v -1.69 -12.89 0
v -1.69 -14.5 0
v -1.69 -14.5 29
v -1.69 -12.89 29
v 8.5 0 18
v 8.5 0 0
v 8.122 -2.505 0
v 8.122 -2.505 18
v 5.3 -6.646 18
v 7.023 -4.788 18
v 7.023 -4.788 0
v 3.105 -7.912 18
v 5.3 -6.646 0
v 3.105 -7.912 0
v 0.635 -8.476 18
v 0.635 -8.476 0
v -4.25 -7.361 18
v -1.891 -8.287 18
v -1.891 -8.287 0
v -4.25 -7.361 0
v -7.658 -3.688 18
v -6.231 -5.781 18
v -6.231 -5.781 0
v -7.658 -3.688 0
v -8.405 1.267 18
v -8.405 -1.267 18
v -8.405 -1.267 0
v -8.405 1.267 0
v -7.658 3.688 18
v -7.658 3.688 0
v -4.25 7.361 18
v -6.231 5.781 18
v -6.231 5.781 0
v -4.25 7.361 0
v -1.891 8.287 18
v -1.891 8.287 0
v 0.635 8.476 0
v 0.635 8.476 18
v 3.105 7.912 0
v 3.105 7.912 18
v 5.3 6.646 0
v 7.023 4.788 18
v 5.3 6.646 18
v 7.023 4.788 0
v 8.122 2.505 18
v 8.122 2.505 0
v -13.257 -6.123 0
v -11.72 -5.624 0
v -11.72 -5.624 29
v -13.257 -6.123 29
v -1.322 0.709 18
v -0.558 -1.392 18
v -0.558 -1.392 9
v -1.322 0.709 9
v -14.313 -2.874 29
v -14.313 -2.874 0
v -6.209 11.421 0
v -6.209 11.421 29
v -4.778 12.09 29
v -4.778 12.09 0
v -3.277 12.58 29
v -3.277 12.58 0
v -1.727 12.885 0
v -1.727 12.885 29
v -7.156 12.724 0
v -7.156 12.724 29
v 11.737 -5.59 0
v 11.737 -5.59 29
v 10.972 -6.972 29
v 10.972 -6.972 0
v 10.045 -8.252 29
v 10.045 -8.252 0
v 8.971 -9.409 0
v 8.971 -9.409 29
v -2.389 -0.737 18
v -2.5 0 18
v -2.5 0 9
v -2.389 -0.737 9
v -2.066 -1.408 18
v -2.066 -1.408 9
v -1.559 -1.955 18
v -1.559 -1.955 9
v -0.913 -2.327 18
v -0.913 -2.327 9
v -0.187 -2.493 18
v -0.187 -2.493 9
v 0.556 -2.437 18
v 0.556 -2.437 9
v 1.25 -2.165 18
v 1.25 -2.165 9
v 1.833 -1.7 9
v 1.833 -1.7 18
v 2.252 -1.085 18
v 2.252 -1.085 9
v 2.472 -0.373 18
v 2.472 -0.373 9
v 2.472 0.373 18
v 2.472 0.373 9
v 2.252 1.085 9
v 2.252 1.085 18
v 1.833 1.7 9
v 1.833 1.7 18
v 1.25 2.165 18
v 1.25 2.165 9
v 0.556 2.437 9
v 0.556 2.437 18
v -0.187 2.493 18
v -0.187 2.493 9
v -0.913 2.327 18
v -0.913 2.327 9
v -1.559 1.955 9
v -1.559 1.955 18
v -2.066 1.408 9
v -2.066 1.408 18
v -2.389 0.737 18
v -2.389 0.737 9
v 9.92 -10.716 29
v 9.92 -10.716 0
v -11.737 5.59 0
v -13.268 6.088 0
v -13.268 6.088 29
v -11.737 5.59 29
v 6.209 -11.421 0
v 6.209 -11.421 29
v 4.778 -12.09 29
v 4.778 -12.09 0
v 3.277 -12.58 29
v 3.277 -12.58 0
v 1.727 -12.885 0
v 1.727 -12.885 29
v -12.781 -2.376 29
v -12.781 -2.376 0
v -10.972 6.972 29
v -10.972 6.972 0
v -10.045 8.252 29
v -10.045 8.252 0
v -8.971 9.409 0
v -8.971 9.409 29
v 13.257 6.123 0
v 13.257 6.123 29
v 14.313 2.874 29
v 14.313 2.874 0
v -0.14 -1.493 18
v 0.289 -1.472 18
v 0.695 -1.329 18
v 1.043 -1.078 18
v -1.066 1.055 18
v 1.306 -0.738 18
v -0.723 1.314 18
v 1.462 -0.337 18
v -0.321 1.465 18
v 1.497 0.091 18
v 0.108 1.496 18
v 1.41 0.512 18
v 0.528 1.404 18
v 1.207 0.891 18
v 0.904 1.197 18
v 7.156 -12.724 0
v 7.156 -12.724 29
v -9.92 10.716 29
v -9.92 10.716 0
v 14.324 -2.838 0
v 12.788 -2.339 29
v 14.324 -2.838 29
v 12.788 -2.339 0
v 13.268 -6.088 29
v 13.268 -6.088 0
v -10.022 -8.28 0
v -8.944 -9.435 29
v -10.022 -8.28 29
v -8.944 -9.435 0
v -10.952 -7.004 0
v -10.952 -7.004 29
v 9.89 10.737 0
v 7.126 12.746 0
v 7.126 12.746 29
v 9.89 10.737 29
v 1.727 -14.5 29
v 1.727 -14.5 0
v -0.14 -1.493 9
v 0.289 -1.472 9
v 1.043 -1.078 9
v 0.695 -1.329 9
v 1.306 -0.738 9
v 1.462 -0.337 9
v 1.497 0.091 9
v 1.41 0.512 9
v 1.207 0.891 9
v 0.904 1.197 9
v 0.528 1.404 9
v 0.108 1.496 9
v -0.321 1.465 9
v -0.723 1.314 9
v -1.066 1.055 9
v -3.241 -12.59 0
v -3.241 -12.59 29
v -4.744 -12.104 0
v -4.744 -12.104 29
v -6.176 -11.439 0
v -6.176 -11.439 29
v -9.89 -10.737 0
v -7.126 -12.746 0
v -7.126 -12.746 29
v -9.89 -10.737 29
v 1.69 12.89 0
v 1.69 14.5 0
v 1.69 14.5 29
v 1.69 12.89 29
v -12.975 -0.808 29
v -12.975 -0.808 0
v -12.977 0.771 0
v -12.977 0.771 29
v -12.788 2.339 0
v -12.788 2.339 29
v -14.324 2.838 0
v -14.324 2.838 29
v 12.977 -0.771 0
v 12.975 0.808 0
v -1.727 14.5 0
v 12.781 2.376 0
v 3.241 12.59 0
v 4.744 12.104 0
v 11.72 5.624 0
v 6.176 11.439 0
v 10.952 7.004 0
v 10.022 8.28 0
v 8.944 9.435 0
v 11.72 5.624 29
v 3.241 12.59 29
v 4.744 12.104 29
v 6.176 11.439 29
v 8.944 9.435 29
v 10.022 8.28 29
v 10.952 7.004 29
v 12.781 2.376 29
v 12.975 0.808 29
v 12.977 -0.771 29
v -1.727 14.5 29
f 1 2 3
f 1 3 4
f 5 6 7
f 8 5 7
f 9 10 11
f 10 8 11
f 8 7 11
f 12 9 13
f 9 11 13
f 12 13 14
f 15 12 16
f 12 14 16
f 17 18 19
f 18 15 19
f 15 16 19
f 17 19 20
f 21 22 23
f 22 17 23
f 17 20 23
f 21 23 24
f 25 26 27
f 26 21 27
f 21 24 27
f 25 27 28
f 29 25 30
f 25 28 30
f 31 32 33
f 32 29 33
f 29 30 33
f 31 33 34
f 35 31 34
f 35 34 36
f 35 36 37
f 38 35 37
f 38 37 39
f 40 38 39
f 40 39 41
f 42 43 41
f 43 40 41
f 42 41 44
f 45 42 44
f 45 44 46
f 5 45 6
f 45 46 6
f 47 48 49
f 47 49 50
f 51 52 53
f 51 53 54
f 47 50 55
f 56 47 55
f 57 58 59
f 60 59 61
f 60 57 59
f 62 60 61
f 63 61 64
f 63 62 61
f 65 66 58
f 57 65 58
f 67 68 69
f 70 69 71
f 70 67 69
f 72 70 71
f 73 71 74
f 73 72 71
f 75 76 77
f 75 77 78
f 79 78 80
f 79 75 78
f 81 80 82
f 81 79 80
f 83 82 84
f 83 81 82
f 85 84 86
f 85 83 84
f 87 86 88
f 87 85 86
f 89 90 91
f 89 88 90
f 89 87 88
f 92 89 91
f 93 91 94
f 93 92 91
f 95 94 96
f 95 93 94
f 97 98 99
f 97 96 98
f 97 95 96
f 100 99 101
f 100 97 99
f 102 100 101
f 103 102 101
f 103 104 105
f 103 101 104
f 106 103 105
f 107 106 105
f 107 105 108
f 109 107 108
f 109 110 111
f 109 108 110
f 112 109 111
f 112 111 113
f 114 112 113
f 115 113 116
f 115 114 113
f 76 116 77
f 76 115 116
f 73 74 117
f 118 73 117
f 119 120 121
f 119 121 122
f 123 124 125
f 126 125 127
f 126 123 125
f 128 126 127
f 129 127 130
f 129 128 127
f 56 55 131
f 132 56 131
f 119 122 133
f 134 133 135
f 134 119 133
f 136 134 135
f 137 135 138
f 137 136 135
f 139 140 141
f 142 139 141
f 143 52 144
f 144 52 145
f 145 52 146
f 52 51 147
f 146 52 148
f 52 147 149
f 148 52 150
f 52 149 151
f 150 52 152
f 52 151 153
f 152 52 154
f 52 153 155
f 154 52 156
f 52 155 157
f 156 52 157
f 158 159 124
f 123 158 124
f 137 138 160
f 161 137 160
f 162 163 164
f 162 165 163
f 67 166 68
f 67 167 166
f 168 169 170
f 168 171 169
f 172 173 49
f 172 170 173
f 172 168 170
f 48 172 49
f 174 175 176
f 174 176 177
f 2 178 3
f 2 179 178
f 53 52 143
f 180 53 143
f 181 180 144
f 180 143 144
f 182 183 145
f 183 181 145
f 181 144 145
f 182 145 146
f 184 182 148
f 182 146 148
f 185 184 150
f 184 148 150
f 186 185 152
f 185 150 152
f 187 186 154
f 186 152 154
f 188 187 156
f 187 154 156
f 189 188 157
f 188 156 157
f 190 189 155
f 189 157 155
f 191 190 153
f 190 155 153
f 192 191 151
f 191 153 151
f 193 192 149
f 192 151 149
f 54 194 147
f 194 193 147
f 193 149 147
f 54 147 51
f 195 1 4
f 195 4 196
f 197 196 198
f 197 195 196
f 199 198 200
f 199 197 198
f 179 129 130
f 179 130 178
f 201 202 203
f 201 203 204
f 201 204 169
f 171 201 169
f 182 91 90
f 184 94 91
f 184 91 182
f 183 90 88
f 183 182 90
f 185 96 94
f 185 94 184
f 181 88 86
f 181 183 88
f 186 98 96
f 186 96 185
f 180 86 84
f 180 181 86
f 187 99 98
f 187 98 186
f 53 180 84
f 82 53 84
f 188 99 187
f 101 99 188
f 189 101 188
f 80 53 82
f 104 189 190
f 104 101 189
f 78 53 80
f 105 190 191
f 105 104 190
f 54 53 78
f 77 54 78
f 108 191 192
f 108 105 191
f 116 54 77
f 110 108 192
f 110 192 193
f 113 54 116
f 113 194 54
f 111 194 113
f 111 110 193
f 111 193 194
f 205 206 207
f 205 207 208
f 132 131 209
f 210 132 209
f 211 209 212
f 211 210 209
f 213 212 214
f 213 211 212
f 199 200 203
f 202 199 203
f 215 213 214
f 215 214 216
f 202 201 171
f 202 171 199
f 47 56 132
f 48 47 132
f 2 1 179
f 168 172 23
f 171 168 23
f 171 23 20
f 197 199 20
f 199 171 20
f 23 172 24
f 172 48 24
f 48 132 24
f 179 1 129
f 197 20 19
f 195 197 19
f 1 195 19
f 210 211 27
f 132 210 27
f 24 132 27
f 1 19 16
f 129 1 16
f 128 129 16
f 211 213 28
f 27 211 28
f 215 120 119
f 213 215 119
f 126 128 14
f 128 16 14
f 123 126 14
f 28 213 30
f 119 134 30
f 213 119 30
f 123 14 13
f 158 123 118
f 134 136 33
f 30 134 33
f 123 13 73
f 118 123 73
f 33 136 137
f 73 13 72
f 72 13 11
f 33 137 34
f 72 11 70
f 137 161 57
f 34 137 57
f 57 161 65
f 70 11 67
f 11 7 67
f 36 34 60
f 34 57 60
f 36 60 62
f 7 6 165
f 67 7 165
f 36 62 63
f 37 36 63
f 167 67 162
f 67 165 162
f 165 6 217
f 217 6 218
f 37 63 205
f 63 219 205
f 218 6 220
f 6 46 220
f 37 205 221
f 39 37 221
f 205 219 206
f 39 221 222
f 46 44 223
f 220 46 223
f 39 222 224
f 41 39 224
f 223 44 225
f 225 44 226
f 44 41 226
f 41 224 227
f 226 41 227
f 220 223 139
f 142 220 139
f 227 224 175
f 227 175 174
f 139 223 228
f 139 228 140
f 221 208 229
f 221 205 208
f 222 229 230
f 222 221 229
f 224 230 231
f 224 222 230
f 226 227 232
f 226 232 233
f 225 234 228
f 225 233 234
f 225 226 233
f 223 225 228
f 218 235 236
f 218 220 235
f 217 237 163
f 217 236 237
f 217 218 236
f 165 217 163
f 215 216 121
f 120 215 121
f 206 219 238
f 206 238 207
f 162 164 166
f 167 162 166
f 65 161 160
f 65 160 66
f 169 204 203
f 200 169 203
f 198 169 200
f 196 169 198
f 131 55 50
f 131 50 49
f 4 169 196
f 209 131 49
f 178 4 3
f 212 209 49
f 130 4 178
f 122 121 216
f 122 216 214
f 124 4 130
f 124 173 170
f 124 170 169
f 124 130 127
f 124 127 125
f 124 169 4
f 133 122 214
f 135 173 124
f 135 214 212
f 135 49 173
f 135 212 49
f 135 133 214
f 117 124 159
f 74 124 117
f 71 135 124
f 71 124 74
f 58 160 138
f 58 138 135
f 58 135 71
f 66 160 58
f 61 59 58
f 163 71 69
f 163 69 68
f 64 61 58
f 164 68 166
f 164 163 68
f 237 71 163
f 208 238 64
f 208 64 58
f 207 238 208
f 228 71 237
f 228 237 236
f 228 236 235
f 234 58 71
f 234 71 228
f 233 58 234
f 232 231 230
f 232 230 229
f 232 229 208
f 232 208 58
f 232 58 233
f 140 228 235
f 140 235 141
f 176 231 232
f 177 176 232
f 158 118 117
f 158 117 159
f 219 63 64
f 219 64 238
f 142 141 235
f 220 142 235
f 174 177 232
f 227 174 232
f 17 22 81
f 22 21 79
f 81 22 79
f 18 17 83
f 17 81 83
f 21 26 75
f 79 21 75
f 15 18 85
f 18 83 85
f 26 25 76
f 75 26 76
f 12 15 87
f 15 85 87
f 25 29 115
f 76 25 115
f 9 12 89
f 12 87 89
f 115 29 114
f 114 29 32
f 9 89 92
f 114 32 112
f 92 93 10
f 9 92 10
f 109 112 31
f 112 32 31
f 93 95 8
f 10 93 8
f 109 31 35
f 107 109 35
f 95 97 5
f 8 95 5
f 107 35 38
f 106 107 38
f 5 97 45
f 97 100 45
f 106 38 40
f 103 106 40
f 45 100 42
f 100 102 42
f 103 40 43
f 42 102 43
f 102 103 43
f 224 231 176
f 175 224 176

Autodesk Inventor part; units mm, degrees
ref_plane "YZ Plane" through (0, 0, 0) normal (1, 0, 0) x (0, 1, 0)
ref_plane "XZ Plane" through (0, 0, 0) normal (0, 1, 0) x (-1, 0, 0)
sketch "Sketch1" plane through (0, 0, 0) normal (0, 0, 1) x (1, 0, 0)
  circle A0 centre (0, 0) radius 17 construction
  circle A1 centre (0, 0) radius 8.5
  line L0 (-1.727, 14.5) -> (1.69, 14.5)
  line L1 (1.69, 14.5) -> (1.69, 12.8897)
  line L2 (-1.727, 12.8848) -> (-1.727, 14.5)
  line L3 (-7.1557, 12.7241) -> (-6.2091, 11.4213)
  line L4 (-9.92, 10.7157) -> (-7.1557, 12.7241)
  line L5 (-8.9706, 9.4089) -> (-9.92, 10.7157)
  line L6 (-13.2681, 6.088) -> (-11.7366, 5.5904)
  line L7 (-14.324, 2.8383) -> (-13.2681, 6.088)
  line L8 (-12.7878, 2.3392) -> (-14.324, 2.8383)
  line L9 (-14.3126, -2.8735) -> (-12.7811, -2.3759)
  line L10 (-13.2567, -6.1232) -> (-14.3126, -2.8735)
  line L11 (-11.7205, -5.624) -> (-13.2567, -6.1232)
  line L12 (-9.8901, -10.7374) -> (-8.9436, -9.4346)
  line L13 (-7.1258, -12.7458) -> (-9.8901, -10.7374)
  line L14 (-6.1764, -11.4391) -> (-7.1258, -12.7458)
  line L15 (-1.69, -14.5) -> (-1.69, -12.8897)
  line L16 (1.727, -14.5) -> (-1.69, -14.5)
  line L17 (1.727, -12.8848) -> (1.727, -14.5)
  line L18 (7.1557, -12.7241) -> (6.2091, -11.4213)
  line L19 (9.92, -10.7157) -> (7.1557, -12.7241)
  line L20 (8.9706, -9.4089) -> (9.92, -10.7157)
  line L21 (13.2681, -6.088) -> (11.7366, -5.5904)
  line L22 (14.324, -2.8383) -> (13.2681, -6.088)
  line L23 (12.7878, -2.3392) -> (14.324, -2.8383)
  line L24 (14.3126, 2.8735) -> (12.7811, 2.3759)
  line L25 (13.2567, 6.1232) -> (14.3126, 2.8735)
  line L26 (11.7205, 5.624) -> (13.2567, 6.1232)
  line L27 (9.8901, 10.7374) -> (8.9436, 9.4346)
  line L28 (7.1258, 12.7458) -> (9.8901, 10.7374)
  line L29 (6.1764, 11.4391) -> (7.1258, 12.7458)
  arc A2 (-1.727, 12.8848) -> (-6.2091, 11.4213) centre (0, 0) ccw construction
  arc A3 (-1.727, 12.8848) -> (-6.2091, 11.4213) centre (0, 0) ccw
  arc A4 (-8.9706, 9.4089) -> (-11.7366, 5.5904) centre (0, 0) ccw
  arc A5 (-8.9706, 9.4089) -> (-11.7366, 5.5904) centre (0, 0) ccw construction
  arc A6 (-12.7878, 2.3392) -> (-12.7811, -2.3759) centre (0, 0) ccw
  arc A7 (-12.7878, 2.3392) -> (-12.7811, -2.3759) centre (0, 0) ccw construction
  arc A8 (-11.7205, -5.624) -> (-8.9436, -9.4346) centre (0, 0) ccw
  arc A9 (-11.7205, -5.624) -> (-8.9436, -9.4346) centre (0, 0) ccw construction
  arc A10 (6.1764, 11.4391) -> (1.69, 12.8897) centre (0, 0) ccw construction
  arc A11 (6.1764, 11.4391) -> (1.69, 12.8897) centre (0, 0) ccw
  arc A12 (12.7878, -2.3392) -> (12.7811, 2.3759) centre (0, 0) ccw
  arc A13 (12.7878, -2.3392) -> (12.7811, 2.3759) centre (0, 0) ccw construction
  arc A14 (8.9706, -9.4089) -> (11.7366, -5.5904) centre (0, 0) ccw
  arc A15 (8.9706, -9.4089) -> (11.7366, -5.5904) centre (0, 0) ccw construction
  arc A16 (-6.1764, -11.4391) -> (-1.69, -12.8897) centre (0, 0) ccw
  arc A17 (1.727, -12.8848) -> (6.2091, -11.4213) centre (0, 0) ccw
  arc A18 (-6.1764, -11.4391) -> (-1.69, -12.8897) centre (0, 0) ccw construction
  arc A19 (1.727, -12.8848) -> (6.2091, -11.4213) centre (0, 0) ccw construction
  arc A20 (11.7205, 5.624) -> (8.9436, 9.4346) centre (0, 0) ccw
  dimension "d5" = 360
  dimension "d14" = 6
  dimension "d15" = 13
  dimension "d16" = 34
  dimension "d17" = 17
extrude "Extrusion1" add sketch "Sketch1" along normal blind 29
sketch "Sketch2" plane through (0, 0, 29) normal (0, 0, 1) x (1, 0, 0)
  line L0 (-6.2091, 11.4213) -> (-7.1557, 12.7241) projected
  line L1 (-7.1557, 12.7241) -> (-9.92, 10.7157) projected
  line L2 (-9.92, 10.7157) -> (-8.9706, 9.4089) projected
  arc A0 (-8.9706, 9.4089) -> (-11.7366, 5.5904) centre (0, 0) ccw projected
  line L3 (-11.7366, 5.5904) -> (-13.2681, 6.088) projected
  line L4 (-13.2681, 6.088) -> (-14.324, 2.8383) projected
  line L5 (-14.324, 2.8383) -> (-12.7878, 2.3392) projected
  arc A1 (-12.7878, 2.3392) -> (-12.7811, -2.3759) centre (0, 0) ccw projected
  line L6 (-12.7811, -2.3759) -> (-14.3126, -2.8735) projected
  line L7 (-14.3126, -2.8735) -> (-13.2567, -6.1232) projected
  line L8 (-13.2567, -6.1232) -> (-11.7205, -5.624) projected
  arc A2 (-11.7205, -5.624) -> (-8.9436, -9.4346) centre (0, 0) ccw projected
  line L9 (-8.9436, -9.4346) -> (-9.8901, -10.7374) projected
  line L10 (-9.8901, -10.7374) -> (-7.1258, -12.7458) projected
  line L11 (-7.1258, -12.7458) -> (-6.1764, -11.4391) projected
  arc A3 (-6.1764, -11.4391) -> (-1.69, -12.8897) centre (0, 0) ccw projected
  line L12 (-1.69, -12.8897) -> (-1.69, -14.5) projected
  line L13 (-1.69, -14.5) -> (1.727, -14.5) projected
  line L14 (1.727, -14.5) -> (1.727, -12.8848) projected
  arc A4 (1.727, -12.8848) -> (6.2091, -11.4213) centre (0, 0) ccw projected
  line L15 (6.2091, -11.4213) -> (7.1557, -12.7241) projected
  line L16 (7.1557, -12.7241) -> (9.92, -10.7157) projected
  line L17 (9.92, -10.7157) -> (8.9706, -9.4089) projected
  arc A5 (8.9706, -9.4089) -> (11.7366, -5.5904) centre (0, 0) ccw projected
  line L18 (11.7366, -5.5904) -> (13.2681, -6.088) projected
  line L19 (13.2681, -6.088) -> (14.324, -2.8383) projected
  line L20 (14.324, -2.8383) -> (12.7878, -2.3392) projected
  arc A6 (12.7878, -2.3392) -> (12.7811, 2.3759) centre (0, 0) ccw projected
  line L21 (12.7811, 2.3759) -> (14.3126, 2.8735) projected
  line L22 (14.3126, 2.8735) -> (13.2567, 6.1232) projected
  line L23 (13.2567, 6.1232) -> (11.7205, 5.624) projected
  arc A7 (11.7205, 5.624) -> (8.9436, 9.4346) centre (0, 0) ccw projected
  line L24 (8.9436, 9.4346) -> (9.8901, 10.7374) projected
  line L25 (9.8901, 10.7374) -> (7.1258, 12.7458) projected
  line L26 (7.1258, 12.7458) -> (6.1764, 11.4391) projected
  arc A8 (6.1764, 11.4391) -> (1.69, 12.8897) centre (0, 0) ccw projected
  line L27 (1.69, 12.8897) -> (1.69, 14.5) projected
  line L28 (1.69, 14.5) -> (-1.727, 14.5) projected
  line L29 (-1.727, 14.5) -> (-1.727, 12.8848) projected
  arc A9 (-1.727, 12.8848) -> (-6.2091, 11.4213) centre (0, 0) ccw projected
  circle A10 centre (0, 0) radius 8.5 projected
  circle A11 centre (0, 0) radius 8.5
extrude "Extrusion2" add sketch "Sketch2" against normal blind 11 contours A10
sketch "Sketch3" plane through (0, 0, 18) normal (0, 0, -1) x (-1, 0, 0)
  arc A0 (1.3217, 0.7094) -> (0.5581, -1.3923) centre (0, 0) ccw
  line L0 (0.5581, -1.3923) -> (1.3217, 0.7094)
  circle A1 centre (0, 0) radius 2.5
  point P0 (0, 0)
  dimension "d11" = 5
extrude "Extrusion3" add sketch "Sketch3" along normal blind 9
ref_plane "Work Plane1" through (-0.5337, -1.6424, 0) normal (-0.9511, 0.309, 0) x (0, 0, 1)
sketch "Sketch4" plane through (-0.5337, -1.6424, 0) normal (-0.9511, 0.309, 0) x (0, 0, 1)
  line L0 (31.9338, 1.727) -> (-3.3978, 1.727) construction
  point P0 (0, 1.727)
ref_plane "Work Plane2" through (0, 0, 29) normal (0, 0, 1) x (1, 0, 0)
sketch "Sketch5" plane through (0, 0, 29) normal (0, 0, 1) x (1, 0, 0)
  circle A0 centre (0, 0) radius 17 construction
  dimension "d19" = 34
properties part number "felga_CPY"
